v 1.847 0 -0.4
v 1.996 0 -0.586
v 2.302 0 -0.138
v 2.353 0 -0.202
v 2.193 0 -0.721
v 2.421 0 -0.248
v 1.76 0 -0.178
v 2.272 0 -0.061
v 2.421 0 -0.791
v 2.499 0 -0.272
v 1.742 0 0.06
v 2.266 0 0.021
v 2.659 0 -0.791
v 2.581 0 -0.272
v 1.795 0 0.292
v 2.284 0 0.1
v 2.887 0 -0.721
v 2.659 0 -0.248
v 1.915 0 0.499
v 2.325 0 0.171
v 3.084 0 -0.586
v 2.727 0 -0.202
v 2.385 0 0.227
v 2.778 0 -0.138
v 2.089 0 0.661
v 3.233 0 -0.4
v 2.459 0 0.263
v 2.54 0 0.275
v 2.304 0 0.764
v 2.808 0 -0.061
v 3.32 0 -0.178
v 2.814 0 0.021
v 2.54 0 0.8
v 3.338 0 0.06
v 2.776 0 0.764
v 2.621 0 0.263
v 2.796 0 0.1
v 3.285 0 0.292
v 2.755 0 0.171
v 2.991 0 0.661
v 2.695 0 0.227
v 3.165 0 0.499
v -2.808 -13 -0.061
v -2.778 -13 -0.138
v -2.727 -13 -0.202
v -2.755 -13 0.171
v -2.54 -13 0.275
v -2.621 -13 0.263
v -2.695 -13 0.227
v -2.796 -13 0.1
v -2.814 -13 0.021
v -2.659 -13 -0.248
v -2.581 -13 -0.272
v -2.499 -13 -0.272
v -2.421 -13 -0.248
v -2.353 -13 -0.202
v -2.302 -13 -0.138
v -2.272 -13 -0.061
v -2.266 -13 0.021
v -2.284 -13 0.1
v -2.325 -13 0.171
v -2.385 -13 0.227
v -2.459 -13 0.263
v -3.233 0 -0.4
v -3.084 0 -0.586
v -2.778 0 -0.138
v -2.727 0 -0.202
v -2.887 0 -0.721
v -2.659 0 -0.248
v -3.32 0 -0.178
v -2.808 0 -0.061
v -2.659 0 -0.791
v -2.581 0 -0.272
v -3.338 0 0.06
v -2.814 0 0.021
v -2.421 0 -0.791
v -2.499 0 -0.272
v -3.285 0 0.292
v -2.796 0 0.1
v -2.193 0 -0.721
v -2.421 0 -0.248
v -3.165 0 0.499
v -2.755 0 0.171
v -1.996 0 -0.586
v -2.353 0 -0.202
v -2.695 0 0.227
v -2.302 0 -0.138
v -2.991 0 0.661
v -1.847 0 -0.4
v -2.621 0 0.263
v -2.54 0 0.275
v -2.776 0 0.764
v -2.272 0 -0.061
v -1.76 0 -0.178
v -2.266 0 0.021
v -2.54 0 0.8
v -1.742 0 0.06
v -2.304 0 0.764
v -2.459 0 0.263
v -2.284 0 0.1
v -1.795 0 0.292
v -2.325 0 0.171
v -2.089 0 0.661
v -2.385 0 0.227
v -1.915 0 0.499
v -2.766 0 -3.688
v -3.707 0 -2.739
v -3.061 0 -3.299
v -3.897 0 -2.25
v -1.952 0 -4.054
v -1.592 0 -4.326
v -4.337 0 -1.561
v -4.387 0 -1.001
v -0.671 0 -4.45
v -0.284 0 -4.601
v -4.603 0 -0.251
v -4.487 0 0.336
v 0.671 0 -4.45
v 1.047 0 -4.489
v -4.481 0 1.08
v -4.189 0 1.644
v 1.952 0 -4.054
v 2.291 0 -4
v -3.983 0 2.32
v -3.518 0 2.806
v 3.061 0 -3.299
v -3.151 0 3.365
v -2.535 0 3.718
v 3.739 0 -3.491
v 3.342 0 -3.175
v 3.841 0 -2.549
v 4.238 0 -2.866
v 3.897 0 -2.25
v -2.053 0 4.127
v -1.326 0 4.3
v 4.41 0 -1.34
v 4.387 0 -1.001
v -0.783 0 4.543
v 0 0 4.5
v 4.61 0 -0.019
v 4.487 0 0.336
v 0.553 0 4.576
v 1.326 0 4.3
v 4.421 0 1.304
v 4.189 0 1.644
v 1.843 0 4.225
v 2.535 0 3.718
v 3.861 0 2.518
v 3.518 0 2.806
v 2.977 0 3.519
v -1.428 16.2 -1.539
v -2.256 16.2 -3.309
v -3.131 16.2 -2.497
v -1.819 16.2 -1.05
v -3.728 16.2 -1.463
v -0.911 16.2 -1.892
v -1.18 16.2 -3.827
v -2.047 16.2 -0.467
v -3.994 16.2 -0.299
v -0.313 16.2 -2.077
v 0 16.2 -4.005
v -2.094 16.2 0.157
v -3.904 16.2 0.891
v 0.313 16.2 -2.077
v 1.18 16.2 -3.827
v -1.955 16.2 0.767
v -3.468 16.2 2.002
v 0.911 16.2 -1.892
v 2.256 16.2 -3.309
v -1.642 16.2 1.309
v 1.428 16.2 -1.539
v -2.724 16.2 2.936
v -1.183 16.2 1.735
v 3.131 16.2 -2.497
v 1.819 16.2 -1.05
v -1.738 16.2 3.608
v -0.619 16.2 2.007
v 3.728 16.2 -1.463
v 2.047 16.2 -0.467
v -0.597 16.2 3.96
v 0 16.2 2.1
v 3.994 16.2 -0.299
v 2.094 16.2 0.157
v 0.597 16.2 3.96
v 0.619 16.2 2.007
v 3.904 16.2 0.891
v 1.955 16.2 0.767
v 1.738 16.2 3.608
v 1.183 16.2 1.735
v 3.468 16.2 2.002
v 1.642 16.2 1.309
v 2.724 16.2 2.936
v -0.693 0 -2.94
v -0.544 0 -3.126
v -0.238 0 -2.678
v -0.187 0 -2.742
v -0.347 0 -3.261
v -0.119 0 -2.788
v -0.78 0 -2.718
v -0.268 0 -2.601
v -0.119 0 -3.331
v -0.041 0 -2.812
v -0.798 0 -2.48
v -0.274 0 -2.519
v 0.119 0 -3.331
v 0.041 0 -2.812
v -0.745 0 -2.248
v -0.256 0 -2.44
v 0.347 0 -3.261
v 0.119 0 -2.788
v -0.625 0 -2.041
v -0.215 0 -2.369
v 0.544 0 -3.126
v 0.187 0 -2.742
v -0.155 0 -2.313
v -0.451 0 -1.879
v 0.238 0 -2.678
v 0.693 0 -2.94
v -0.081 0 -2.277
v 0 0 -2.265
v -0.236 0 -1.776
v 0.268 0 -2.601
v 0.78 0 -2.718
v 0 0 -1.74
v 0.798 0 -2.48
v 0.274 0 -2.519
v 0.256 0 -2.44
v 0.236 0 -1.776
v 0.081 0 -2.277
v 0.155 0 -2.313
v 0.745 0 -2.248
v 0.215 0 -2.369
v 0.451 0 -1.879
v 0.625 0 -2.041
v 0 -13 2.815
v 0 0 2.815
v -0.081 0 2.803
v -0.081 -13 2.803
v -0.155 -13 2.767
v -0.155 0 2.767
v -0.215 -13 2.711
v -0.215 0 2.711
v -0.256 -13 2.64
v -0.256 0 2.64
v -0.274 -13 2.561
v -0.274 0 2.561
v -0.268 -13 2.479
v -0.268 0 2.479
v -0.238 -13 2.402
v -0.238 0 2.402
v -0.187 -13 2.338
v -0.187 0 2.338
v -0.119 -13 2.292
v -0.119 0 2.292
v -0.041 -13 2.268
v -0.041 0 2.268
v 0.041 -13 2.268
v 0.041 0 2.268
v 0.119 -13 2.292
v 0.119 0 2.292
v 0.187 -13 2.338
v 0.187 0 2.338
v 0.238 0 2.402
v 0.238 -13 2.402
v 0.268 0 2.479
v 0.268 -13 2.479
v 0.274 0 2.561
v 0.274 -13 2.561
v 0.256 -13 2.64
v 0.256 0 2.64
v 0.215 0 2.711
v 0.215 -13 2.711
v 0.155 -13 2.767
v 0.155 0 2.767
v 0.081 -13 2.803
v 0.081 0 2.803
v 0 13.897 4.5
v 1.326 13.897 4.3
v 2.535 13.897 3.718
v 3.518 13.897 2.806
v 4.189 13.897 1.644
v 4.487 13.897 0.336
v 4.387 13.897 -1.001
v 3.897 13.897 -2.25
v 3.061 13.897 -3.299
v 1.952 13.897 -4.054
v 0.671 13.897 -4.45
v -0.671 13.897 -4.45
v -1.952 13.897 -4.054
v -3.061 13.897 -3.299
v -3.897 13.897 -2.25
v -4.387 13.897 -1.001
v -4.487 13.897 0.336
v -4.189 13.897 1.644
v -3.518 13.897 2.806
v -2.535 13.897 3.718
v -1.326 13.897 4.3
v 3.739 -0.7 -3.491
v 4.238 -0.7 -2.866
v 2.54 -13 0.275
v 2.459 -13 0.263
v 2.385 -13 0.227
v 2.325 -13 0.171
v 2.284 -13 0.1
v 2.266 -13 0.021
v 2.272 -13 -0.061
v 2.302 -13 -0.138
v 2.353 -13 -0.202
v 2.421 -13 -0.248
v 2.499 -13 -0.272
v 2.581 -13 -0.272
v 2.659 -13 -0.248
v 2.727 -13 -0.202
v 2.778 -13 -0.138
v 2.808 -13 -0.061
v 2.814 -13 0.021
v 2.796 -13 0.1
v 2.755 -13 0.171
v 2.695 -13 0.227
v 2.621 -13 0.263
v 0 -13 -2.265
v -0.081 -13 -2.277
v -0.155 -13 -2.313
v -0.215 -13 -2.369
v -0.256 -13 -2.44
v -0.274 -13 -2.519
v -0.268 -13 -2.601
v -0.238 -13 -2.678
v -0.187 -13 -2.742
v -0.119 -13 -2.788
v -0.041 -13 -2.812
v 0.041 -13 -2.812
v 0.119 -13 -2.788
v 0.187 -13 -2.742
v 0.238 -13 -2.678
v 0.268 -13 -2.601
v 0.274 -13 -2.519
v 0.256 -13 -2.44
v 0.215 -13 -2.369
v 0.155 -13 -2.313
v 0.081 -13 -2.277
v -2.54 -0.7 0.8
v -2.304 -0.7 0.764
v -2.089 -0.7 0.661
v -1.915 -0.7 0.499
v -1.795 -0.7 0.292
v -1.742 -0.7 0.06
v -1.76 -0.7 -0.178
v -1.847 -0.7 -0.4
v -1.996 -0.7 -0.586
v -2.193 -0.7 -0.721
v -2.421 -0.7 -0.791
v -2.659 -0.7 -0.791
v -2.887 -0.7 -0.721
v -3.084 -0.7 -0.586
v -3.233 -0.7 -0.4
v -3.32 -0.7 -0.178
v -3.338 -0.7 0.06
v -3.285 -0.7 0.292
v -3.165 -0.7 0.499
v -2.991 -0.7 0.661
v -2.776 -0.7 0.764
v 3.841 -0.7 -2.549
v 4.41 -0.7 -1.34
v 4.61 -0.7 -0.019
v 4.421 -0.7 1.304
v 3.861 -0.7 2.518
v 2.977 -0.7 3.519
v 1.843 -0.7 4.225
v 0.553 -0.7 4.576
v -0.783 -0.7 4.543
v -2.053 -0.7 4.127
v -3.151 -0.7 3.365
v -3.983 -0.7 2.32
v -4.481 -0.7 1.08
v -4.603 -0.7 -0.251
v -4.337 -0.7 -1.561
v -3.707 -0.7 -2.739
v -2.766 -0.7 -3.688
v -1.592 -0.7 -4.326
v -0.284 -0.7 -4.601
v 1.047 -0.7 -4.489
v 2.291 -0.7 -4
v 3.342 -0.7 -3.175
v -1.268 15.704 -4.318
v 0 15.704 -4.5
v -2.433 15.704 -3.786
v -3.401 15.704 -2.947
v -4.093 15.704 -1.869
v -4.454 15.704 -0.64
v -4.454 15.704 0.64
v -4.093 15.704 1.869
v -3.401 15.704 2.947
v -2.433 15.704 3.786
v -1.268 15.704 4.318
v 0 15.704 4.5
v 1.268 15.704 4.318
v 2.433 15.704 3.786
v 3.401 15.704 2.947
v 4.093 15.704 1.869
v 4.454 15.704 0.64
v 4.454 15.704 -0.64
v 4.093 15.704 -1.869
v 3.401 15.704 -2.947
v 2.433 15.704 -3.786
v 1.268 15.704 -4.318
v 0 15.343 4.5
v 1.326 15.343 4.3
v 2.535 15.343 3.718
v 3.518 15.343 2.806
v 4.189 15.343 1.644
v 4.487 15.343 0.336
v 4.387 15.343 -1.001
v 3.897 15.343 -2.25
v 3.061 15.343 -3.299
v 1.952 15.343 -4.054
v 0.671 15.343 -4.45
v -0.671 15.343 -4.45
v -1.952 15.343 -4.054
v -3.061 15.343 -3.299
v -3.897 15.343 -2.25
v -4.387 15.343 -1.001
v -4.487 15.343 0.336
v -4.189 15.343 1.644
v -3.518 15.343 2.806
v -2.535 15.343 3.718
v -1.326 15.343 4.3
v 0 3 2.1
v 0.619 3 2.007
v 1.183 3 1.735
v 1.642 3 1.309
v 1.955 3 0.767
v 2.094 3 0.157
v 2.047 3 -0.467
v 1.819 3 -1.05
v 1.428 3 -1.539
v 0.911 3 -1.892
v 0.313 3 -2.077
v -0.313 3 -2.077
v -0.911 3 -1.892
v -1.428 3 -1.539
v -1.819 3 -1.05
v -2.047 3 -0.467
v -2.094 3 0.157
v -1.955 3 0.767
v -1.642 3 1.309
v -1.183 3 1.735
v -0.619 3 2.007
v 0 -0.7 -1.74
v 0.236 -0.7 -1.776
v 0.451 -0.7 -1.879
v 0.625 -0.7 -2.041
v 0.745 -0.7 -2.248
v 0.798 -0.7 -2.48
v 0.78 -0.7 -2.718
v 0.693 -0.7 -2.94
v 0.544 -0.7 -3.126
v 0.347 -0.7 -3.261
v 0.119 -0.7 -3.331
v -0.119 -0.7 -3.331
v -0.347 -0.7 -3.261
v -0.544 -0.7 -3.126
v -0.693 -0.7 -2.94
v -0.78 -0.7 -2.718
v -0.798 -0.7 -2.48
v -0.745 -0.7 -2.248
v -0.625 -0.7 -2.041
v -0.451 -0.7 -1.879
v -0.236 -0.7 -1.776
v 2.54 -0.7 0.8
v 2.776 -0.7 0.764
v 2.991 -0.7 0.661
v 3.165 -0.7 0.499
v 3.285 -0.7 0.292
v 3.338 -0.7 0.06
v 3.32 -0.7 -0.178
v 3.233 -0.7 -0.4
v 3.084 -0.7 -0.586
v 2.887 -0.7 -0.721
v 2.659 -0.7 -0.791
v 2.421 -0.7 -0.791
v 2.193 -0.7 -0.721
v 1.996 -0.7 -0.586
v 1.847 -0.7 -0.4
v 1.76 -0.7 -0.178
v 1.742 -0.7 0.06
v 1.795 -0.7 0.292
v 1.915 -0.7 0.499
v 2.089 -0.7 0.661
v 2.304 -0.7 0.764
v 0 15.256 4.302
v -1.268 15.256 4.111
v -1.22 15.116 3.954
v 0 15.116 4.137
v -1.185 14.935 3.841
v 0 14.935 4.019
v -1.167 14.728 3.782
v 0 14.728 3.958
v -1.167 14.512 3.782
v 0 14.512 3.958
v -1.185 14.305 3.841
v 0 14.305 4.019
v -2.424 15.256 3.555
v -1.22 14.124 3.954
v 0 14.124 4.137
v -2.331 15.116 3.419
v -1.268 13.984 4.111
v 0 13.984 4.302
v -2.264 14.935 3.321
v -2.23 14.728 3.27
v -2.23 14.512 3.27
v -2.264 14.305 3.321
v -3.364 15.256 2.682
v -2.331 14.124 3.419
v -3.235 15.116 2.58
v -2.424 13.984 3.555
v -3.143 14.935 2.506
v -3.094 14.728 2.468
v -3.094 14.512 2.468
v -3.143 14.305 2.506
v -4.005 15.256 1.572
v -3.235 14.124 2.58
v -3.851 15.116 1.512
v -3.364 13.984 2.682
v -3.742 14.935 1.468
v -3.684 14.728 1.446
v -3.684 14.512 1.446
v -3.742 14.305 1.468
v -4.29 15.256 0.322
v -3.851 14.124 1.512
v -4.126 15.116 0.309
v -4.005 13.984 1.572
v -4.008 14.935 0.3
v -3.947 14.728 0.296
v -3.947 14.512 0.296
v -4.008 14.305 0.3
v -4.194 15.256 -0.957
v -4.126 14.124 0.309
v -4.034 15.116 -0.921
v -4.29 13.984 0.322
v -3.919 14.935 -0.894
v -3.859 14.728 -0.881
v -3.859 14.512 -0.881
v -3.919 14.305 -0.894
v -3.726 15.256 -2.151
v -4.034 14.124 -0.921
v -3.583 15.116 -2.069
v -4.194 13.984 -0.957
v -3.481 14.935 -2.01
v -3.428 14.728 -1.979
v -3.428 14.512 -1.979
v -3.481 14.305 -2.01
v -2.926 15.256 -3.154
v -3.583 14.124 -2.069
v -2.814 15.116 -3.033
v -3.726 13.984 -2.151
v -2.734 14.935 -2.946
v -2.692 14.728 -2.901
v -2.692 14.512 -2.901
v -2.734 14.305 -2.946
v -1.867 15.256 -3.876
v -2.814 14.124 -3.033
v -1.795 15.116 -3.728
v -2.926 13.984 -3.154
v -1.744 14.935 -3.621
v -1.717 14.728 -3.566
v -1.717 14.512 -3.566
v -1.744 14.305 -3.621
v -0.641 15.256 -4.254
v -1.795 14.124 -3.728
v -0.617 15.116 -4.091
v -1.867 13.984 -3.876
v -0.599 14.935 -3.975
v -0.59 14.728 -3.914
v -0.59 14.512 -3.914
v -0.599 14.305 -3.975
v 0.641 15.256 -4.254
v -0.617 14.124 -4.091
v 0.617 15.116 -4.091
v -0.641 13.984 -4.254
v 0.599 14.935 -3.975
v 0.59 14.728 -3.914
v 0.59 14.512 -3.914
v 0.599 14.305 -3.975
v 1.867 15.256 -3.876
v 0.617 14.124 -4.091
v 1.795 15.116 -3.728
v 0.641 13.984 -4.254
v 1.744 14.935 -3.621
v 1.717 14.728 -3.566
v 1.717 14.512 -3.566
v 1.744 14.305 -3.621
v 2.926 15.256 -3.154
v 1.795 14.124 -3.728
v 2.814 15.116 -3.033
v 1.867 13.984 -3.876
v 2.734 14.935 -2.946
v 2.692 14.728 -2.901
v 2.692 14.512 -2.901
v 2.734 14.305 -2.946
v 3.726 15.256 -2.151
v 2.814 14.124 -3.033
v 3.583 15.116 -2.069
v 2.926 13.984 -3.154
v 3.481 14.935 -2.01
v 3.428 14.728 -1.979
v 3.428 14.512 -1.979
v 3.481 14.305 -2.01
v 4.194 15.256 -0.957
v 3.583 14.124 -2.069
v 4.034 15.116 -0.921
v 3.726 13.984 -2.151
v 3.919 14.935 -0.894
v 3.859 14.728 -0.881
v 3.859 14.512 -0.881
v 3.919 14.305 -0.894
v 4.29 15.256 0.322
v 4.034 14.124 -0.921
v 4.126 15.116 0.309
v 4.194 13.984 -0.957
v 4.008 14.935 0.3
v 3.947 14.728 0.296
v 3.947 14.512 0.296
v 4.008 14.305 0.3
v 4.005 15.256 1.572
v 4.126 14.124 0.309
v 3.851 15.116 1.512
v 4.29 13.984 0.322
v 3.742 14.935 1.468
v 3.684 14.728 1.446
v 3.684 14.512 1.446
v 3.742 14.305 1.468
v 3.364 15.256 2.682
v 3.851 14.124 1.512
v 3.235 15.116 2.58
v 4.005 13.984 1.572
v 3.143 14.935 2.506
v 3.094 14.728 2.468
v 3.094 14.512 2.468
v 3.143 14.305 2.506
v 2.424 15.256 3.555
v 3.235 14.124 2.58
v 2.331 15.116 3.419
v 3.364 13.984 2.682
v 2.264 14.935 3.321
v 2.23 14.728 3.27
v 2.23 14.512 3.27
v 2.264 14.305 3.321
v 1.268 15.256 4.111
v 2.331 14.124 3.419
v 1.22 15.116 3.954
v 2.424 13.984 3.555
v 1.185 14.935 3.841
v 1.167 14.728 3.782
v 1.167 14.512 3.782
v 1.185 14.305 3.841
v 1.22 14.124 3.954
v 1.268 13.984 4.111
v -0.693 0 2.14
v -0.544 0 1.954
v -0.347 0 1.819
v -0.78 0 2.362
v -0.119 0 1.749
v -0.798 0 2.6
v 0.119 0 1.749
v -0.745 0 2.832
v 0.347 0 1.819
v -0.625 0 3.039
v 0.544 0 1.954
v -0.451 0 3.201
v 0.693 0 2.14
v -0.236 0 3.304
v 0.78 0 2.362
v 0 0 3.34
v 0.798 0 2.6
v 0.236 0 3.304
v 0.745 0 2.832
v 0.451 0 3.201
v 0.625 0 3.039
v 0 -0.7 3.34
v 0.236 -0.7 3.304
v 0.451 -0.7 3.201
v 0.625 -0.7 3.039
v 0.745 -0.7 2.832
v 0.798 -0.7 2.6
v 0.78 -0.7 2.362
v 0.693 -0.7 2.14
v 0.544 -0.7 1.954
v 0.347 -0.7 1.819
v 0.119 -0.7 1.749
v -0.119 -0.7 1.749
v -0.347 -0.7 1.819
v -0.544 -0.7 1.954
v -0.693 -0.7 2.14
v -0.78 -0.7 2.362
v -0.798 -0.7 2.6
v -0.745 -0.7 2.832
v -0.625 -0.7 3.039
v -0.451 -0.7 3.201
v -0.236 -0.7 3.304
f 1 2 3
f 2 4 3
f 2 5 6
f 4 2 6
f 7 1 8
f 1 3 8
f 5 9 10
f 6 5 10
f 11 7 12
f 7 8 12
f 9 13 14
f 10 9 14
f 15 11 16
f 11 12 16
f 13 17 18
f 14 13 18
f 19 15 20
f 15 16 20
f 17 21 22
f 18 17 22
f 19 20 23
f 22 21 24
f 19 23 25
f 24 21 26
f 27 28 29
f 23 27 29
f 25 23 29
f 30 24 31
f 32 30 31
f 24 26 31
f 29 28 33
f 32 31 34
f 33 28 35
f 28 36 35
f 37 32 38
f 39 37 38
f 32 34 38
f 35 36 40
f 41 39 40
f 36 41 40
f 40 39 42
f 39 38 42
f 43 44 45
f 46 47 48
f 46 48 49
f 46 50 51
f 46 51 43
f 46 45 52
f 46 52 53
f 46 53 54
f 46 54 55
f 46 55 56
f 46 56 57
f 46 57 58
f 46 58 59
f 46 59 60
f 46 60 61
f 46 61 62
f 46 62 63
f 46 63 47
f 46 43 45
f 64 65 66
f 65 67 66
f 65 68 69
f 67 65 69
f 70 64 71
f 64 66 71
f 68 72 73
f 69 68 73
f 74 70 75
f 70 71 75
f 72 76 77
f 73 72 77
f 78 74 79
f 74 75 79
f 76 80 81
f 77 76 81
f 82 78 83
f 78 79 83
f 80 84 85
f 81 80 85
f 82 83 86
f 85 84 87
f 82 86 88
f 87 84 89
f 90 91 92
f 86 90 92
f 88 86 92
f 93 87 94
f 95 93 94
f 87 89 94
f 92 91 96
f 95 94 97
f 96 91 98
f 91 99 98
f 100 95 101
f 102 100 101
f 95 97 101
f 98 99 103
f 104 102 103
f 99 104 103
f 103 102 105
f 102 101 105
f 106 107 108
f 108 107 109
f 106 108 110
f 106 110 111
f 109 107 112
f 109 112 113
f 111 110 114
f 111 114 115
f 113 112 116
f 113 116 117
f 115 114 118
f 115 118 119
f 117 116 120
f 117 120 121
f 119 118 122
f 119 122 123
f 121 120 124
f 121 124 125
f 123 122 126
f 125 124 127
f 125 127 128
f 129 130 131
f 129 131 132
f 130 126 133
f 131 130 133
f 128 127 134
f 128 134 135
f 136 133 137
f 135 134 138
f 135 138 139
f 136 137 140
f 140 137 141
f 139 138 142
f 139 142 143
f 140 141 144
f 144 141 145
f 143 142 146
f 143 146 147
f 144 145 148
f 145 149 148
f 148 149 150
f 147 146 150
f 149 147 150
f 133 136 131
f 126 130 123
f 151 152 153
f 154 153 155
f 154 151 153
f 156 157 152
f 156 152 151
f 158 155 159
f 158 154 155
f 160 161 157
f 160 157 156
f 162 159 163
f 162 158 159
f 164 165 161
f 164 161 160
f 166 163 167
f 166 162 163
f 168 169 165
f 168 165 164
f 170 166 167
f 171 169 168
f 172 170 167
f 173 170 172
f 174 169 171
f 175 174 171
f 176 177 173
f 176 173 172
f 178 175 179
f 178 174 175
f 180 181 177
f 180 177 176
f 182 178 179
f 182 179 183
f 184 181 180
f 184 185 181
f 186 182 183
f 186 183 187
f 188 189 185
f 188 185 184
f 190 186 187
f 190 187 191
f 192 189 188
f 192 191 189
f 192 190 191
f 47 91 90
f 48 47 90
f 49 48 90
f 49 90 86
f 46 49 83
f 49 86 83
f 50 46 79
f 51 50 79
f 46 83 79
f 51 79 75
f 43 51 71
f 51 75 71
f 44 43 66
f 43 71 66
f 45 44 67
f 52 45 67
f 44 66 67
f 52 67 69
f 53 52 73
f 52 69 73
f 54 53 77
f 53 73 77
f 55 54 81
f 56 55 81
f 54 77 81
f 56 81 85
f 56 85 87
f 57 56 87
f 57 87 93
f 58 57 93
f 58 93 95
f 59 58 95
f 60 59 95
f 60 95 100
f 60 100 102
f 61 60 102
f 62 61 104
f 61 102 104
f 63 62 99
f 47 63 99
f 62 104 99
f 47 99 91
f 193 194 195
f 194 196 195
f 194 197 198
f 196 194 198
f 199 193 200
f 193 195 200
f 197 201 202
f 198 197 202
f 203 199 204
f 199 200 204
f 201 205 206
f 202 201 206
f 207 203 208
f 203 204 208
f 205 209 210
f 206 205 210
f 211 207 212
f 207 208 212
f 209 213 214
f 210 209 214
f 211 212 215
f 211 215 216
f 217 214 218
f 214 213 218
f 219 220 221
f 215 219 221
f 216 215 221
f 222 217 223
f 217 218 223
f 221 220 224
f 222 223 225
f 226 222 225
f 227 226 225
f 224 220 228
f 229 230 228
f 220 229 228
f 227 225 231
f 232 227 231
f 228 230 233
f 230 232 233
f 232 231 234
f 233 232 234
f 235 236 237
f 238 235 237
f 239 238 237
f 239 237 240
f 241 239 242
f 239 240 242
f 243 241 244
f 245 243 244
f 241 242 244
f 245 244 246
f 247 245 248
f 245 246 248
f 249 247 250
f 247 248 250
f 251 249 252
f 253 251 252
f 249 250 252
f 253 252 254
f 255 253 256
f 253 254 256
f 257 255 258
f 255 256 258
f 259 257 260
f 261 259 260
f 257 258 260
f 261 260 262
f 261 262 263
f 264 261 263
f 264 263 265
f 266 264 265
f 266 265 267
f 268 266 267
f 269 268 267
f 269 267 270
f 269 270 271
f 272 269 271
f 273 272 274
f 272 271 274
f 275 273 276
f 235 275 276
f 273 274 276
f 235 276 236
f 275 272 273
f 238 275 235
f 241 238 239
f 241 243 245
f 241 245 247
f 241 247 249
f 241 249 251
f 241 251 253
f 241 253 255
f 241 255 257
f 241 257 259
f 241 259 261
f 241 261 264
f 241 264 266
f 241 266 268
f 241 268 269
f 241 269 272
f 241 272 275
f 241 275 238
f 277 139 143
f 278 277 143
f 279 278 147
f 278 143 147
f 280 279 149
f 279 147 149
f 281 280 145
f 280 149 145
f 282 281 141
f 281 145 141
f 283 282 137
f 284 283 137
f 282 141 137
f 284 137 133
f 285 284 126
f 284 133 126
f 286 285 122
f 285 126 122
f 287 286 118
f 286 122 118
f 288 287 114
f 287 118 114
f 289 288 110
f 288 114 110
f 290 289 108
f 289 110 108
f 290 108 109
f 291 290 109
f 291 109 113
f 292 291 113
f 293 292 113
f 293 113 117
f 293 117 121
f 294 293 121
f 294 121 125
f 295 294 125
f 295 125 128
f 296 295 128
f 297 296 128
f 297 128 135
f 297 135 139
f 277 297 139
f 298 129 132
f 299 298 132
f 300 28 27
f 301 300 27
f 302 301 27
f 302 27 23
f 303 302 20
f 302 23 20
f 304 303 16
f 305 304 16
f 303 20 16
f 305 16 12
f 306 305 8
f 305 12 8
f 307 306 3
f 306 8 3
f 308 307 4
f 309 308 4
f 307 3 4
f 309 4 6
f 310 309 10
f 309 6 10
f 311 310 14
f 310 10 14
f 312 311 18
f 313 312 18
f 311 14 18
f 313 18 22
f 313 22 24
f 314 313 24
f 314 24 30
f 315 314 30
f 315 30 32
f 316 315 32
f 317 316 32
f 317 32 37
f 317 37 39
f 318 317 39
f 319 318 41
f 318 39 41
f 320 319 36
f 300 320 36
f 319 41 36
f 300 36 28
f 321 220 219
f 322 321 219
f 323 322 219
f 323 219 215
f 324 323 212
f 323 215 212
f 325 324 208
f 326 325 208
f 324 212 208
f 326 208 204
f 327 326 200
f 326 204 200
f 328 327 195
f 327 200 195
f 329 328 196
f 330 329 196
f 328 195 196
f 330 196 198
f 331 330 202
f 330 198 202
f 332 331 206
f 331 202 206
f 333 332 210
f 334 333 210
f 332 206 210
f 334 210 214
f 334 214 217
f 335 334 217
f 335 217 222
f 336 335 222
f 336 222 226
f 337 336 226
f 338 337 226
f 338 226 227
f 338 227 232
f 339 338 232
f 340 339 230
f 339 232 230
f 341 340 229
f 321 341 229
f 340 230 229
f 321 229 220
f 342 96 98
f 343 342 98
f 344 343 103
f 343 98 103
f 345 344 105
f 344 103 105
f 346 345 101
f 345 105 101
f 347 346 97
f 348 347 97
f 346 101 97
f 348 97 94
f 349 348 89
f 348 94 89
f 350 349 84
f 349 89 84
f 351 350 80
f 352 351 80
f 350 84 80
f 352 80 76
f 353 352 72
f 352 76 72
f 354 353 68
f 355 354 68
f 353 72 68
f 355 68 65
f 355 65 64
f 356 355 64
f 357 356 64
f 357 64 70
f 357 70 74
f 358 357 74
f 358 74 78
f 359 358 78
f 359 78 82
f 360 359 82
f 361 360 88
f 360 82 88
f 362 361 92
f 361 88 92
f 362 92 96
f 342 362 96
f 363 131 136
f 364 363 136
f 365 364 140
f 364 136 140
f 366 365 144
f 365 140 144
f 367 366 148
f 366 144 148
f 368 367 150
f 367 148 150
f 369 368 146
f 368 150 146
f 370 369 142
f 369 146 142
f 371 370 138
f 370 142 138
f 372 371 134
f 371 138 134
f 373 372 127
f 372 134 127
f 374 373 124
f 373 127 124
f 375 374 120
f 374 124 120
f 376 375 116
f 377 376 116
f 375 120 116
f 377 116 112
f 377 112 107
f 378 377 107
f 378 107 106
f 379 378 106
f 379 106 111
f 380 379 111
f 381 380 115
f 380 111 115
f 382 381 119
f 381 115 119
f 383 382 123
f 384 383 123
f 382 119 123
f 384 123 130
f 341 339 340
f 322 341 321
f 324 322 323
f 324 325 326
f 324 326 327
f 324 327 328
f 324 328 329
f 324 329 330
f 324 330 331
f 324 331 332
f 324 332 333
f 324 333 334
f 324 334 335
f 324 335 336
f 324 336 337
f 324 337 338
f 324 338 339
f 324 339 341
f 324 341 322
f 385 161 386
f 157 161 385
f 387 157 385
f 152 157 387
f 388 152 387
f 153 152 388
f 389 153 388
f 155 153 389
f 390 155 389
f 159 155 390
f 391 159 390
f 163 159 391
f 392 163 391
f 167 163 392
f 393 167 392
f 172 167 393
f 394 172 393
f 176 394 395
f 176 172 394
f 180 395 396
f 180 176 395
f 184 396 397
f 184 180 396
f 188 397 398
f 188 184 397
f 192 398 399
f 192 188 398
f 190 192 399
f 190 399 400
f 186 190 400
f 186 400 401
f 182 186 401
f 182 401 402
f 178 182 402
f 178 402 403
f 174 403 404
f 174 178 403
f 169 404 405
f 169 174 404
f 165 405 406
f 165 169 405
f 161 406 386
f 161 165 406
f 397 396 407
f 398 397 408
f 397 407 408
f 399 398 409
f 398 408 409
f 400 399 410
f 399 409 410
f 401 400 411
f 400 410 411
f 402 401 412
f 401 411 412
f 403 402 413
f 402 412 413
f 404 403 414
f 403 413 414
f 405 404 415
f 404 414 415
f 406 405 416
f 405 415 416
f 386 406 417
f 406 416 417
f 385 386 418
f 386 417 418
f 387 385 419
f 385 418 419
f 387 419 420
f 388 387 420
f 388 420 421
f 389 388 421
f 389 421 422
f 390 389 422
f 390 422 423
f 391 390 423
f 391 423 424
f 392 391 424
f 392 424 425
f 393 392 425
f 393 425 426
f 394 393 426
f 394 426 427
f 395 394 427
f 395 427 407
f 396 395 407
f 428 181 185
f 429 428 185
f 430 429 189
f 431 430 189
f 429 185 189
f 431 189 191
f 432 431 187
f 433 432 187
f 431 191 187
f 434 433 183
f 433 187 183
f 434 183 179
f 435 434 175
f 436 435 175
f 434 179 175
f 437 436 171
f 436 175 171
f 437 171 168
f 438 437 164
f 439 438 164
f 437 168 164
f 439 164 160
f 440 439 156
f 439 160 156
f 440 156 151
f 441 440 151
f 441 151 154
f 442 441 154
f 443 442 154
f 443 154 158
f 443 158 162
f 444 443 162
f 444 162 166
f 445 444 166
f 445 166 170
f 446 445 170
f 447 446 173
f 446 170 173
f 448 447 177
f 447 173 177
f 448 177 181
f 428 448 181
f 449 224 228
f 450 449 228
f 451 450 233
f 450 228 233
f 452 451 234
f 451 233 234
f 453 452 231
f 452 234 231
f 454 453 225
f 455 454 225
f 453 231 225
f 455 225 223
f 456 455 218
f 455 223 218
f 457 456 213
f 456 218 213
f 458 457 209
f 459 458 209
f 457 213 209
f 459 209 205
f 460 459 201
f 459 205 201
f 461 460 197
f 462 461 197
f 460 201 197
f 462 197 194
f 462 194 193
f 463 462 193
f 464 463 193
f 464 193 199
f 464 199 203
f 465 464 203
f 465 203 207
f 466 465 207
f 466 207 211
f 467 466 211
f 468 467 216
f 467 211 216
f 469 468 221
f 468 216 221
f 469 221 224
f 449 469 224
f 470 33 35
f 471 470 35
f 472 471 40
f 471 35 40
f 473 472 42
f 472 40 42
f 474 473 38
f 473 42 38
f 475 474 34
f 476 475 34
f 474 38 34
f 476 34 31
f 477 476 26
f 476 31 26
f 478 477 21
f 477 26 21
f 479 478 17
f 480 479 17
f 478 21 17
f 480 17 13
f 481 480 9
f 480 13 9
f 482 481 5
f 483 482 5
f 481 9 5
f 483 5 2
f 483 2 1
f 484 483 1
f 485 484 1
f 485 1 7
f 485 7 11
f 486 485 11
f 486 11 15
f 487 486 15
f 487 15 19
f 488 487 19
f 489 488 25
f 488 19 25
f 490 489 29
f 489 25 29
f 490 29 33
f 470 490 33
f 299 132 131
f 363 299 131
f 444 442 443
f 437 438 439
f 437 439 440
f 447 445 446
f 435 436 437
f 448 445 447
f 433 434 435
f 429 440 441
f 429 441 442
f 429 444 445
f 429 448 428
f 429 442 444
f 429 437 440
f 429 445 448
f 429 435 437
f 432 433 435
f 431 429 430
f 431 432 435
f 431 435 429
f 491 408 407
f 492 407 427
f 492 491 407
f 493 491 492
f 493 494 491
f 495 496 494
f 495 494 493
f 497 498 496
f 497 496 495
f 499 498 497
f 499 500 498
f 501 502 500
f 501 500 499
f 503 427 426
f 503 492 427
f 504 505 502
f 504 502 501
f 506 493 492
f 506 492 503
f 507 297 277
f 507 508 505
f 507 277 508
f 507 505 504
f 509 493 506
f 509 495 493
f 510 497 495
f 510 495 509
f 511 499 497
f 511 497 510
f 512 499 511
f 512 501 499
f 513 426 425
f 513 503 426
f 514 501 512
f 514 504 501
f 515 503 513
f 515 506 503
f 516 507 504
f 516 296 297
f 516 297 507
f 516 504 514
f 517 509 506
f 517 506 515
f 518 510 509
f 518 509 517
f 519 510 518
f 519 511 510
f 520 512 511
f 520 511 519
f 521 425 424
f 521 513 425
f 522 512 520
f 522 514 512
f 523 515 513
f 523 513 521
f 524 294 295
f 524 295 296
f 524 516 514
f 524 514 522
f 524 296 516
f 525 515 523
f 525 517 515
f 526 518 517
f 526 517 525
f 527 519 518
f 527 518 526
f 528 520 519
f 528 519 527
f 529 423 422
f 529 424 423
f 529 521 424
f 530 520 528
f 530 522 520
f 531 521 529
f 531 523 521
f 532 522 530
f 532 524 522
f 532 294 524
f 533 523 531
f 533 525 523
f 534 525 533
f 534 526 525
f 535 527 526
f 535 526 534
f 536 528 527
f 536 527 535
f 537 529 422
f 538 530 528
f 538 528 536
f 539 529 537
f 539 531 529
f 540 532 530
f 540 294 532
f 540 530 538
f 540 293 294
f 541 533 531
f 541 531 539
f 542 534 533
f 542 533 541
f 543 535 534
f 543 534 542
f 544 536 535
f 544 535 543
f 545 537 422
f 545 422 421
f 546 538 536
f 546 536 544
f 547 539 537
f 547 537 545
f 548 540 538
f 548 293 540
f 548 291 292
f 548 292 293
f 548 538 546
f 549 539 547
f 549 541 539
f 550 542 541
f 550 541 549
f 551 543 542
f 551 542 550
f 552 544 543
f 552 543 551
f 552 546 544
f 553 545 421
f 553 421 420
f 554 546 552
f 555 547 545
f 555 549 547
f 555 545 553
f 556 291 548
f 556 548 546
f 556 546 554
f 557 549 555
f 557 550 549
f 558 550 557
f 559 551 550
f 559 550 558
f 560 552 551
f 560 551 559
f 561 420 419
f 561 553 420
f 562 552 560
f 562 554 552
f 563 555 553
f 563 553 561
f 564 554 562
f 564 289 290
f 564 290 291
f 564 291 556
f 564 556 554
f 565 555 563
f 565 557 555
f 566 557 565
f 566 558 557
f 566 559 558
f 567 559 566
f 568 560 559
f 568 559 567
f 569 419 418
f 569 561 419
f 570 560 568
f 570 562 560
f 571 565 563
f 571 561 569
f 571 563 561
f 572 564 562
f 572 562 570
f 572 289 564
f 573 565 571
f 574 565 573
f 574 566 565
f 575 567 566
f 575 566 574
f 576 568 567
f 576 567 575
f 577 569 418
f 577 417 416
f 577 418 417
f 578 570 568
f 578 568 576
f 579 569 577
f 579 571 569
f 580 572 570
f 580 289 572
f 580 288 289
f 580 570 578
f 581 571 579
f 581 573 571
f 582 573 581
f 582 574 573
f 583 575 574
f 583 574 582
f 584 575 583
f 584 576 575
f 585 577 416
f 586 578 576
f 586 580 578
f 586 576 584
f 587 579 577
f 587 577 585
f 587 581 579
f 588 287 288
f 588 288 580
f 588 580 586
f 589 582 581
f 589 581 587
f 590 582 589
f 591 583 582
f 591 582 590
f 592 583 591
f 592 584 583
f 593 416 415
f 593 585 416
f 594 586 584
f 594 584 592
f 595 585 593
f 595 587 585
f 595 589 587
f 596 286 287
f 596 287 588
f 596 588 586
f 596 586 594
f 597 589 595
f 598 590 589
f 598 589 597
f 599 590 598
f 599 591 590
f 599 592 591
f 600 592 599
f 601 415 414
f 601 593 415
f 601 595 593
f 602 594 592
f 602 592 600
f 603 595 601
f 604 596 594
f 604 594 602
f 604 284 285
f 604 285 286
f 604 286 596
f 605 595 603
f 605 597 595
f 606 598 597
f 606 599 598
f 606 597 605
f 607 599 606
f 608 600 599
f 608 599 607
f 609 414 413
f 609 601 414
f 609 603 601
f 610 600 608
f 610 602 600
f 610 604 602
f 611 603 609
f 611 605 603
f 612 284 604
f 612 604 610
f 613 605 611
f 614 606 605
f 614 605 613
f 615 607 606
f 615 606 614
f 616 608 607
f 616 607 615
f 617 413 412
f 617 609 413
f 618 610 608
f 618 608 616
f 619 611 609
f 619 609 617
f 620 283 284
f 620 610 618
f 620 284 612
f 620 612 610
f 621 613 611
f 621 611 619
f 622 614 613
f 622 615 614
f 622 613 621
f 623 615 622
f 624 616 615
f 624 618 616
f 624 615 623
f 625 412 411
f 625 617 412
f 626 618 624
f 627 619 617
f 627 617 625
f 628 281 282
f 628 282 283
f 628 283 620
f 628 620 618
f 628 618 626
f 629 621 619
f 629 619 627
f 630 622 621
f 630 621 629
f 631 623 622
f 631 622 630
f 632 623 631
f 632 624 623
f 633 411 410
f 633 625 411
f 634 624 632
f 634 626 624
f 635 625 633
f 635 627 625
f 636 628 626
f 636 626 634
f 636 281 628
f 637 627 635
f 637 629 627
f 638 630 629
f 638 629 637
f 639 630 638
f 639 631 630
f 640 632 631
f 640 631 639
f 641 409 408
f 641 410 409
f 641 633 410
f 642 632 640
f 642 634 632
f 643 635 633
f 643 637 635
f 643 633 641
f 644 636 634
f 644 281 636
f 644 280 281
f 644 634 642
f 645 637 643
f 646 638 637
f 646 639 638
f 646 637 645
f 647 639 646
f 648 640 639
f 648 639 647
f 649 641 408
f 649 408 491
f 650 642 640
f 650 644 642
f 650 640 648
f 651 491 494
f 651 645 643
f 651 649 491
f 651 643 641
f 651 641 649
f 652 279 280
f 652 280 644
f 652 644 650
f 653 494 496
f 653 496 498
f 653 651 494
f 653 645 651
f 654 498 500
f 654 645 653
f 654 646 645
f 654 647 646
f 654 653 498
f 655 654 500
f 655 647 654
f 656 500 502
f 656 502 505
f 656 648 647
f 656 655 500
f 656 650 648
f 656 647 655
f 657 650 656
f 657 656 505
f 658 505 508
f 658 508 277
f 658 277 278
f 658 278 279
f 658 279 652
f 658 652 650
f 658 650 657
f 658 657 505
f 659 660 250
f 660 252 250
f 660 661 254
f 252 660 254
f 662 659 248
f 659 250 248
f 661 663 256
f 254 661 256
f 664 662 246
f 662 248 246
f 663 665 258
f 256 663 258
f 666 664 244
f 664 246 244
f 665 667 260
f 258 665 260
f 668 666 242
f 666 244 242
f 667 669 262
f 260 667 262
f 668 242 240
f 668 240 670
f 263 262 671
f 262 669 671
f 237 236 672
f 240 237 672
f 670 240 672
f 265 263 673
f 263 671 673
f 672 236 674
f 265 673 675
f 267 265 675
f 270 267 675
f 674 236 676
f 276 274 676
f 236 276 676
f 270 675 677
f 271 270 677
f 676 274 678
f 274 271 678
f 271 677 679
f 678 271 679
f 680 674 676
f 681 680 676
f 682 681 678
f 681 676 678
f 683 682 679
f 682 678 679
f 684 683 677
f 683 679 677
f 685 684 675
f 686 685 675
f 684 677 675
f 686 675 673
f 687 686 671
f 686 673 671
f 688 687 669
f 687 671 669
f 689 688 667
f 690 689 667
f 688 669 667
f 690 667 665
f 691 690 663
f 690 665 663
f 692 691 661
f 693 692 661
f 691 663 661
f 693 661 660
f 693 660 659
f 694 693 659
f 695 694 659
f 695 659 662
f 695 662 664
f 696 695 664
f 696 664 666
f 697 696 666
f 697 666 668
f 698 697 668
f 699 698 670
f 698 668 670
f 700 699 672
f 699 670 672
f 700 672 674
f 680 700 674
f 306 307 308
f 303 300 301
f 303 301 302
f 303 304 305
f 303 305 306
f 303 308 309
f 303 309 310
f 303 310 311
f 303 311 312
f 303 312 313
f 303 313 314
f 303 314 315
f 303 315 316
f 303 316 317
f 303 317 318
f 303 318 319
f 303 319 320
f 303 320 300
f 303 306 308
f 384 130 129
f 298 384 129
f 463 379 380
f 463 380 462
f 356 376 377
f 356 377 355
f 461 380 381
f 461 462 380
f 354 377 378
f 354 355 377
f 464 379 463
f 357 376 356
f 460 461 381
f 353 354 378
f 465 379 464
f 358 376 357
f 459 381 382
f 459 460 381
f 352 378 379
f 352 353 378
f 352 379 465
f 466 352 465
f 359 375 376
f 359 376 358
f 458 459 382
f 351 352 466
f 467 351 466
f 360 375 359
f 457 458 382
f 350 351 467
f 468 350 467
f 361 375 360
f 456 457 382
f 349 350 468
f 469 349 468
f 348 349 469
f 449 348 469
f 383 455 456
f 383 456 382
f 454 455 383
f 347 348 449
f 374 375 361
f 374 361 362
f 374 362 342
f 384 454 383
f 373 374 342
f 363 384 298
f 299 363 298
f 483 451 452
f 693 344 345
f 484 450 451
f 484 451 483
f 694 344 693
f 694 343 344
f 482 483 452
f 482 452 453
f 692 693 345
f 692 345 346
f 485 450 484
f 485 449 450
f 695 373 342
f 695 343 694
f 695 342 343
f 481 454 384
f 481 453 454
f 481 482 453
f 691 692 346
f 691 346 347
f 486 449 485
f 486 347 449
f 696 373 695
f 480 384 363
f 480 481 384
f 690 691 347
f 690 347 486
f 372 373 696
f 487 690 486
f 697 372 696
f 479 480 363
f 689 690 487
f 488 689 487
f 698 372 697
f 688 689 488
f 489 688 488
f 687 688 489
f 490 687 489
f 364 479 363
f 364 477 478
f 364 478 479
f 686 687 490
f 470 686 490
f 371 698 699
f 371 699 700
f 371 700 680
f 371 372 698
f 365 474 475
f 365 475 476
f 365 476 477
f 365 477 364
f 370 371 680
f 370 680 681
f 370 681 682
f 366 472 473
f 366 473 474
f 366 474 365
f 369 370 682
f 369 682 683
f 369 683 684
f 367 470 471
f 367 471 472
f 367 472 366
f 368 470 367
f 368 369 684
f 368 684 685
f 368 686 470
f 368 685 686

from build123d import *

# Parameters (mm, degrees)
ESBO_O2_R                = 4.5
RESSALTO_EXTRUS_O1_DEPTH = 16.2
ESBO_O3_R                = 2.1
CORTE_EXTRUS_O2_DEPTH    = 13.2
ESBO_O5_R                = 0.75
RESSALTO_EXTRUS_O2_DEPTH = 0.7
ESBO_O11_R               = 0.8
CORTE_EXTRUS_O3_DEPTH    = 0.7
ESBO_O8_R                = 0.275
RESSALTO_EXTRUS_O3_DEPTH = 13


with BuildPart() as part:
    # Esboço2 → Ressalto-extrusão1 (new body)
    with BuildSketch(Plane(origin=(0, 0, 0), x_dir=(1, 0, 0), z_dir=(0, 1, 0))):
        with Locations(Location((0, 0, 0), (0, 0, 270))):
            Circle(ESBO_O2_R)
    extrude(amount=RESSALTO_EXTRUS_O1_DEPTH)

    # Esboço3 → Corte-extrusão2 (cut)
    with BuildSketch(Plane(origin=(0, 16.2, 0), x_dir=(1, 0, 0), z_dir=(0, 1, 0))):
        with Locations(Location((0, 0, 0), (0, 0, 270))):
            Circle(ESBO_O3_R)
    extrude(amount=-CORTE_EXTRUS_O2_DEPTH, mode=Mode.SUBTRACT)

    # Esboço5 → Corte-Revolução1 (revolve, cut)
    with BuildSketch(Plane(origin=(0, 0, 0), x_dir=(0, 0, -1), z_dir=(1, 0, 0)), mode=Mode.PRIVATE) as corte_revolu_o1_sk:
        with Locations((4.7, 14.62)):
            Circle(ESBO_O5_R)
    revolve(corte_revolu_o1_sk.sketch.rotate(Axis((0, 16.2, 0), (0, -1, 0)), 180), axis=Axis((0, 16.2, 0), (0, -1, 0)), mode=Mode.SUBTRACT)

    # Esboço12 → Ressalto-extrusão2 (add)
    with BuildSketch(Plane.XZ):
        with BuildLine():
            Line((3.342126206, -3.174726822), (3.73922223, -3.491162716))
            Line((3.73922223, -3.491162716), (4.237785194, -2.865515075))
            Line((4.237785194, -2.865515075), (3.84068917, -2.549079181))
            ThreePointArc((3.84068917, -2.549079181), (-3.605005954, 2.87273912), (3.342126206, -3.174726822))
        make_face()
    extrude(amount=RESSALTO_EXTRUS_O2_DEPTH)

    # Esboço11 → Corte-extrusão3 (cut)
    with BuildSketch(Plane(origin=(0, 0, 0), x_dir=(1, 0, 0), z_dir=(0, 1, 0))):
        with Locations(Location((2.54, 0, 0), (0, 0, 270))):
            Circle(ESBO_O11_R)
        with Locations(Location((0, -2.54, 0), (0, 0, 270))):
            Circle(ESBO_O11_R)
        with Locations(Location((-2.54, 0, 0), (0, 0, 270))):
            Circle(ESBO_O11_R)
        with Locations(Location((0, 2.54, 0), (0, 0, 270))):
            Circle(ESBO_O11_R)
    extrude(amount=-CORTE_EXTRUS_O3_DEPTH, mode=Mode.SUBTRACT)

    # Esboço8 → Ressalto-extrusão3 (add)
    with BuildSketch(Plane(origin=(0, 0, 0), x_dir=(-1, 0, 0), z_dir=(0, -1, 0))):
        with Locations(Location((-2.54, 0, 0), (0, 0, 270))):
            Circle(ESBO_O8_R)
        with Locations(Location((0, 2.54, 0), (0, 0, 270))):
            Circle(ESBO_O8_R)
        with Locations(Location((2.54, 0, 0), (0, 0, 270))):
            Circle(ESBO_O8_R)
        with Locations(Location((0, -2.54, 0), (0, 0, 270))):
            Circle(ESBO_O8_R)
    extrude(amount=RESSALTO_EXTRUS_O3_DEPTH)

    # Esboço15 → Corte-Revolução2 (revolve, cut)
    with BuildSketch(Plane(origin=(0, 0, 0), x_dir=(0, 0, -1), z_dir=(1, 0, 0))):
        Polygon((4.5, 16.20375847), (4.5, 15.70375847), (4.000000985, 16.204750978), align=None)
    revolve(axis=Axis((0, 16.204750978, 0), (0, 1, 0)), mode=Mode.SUBTRACT)


solid = part.part
